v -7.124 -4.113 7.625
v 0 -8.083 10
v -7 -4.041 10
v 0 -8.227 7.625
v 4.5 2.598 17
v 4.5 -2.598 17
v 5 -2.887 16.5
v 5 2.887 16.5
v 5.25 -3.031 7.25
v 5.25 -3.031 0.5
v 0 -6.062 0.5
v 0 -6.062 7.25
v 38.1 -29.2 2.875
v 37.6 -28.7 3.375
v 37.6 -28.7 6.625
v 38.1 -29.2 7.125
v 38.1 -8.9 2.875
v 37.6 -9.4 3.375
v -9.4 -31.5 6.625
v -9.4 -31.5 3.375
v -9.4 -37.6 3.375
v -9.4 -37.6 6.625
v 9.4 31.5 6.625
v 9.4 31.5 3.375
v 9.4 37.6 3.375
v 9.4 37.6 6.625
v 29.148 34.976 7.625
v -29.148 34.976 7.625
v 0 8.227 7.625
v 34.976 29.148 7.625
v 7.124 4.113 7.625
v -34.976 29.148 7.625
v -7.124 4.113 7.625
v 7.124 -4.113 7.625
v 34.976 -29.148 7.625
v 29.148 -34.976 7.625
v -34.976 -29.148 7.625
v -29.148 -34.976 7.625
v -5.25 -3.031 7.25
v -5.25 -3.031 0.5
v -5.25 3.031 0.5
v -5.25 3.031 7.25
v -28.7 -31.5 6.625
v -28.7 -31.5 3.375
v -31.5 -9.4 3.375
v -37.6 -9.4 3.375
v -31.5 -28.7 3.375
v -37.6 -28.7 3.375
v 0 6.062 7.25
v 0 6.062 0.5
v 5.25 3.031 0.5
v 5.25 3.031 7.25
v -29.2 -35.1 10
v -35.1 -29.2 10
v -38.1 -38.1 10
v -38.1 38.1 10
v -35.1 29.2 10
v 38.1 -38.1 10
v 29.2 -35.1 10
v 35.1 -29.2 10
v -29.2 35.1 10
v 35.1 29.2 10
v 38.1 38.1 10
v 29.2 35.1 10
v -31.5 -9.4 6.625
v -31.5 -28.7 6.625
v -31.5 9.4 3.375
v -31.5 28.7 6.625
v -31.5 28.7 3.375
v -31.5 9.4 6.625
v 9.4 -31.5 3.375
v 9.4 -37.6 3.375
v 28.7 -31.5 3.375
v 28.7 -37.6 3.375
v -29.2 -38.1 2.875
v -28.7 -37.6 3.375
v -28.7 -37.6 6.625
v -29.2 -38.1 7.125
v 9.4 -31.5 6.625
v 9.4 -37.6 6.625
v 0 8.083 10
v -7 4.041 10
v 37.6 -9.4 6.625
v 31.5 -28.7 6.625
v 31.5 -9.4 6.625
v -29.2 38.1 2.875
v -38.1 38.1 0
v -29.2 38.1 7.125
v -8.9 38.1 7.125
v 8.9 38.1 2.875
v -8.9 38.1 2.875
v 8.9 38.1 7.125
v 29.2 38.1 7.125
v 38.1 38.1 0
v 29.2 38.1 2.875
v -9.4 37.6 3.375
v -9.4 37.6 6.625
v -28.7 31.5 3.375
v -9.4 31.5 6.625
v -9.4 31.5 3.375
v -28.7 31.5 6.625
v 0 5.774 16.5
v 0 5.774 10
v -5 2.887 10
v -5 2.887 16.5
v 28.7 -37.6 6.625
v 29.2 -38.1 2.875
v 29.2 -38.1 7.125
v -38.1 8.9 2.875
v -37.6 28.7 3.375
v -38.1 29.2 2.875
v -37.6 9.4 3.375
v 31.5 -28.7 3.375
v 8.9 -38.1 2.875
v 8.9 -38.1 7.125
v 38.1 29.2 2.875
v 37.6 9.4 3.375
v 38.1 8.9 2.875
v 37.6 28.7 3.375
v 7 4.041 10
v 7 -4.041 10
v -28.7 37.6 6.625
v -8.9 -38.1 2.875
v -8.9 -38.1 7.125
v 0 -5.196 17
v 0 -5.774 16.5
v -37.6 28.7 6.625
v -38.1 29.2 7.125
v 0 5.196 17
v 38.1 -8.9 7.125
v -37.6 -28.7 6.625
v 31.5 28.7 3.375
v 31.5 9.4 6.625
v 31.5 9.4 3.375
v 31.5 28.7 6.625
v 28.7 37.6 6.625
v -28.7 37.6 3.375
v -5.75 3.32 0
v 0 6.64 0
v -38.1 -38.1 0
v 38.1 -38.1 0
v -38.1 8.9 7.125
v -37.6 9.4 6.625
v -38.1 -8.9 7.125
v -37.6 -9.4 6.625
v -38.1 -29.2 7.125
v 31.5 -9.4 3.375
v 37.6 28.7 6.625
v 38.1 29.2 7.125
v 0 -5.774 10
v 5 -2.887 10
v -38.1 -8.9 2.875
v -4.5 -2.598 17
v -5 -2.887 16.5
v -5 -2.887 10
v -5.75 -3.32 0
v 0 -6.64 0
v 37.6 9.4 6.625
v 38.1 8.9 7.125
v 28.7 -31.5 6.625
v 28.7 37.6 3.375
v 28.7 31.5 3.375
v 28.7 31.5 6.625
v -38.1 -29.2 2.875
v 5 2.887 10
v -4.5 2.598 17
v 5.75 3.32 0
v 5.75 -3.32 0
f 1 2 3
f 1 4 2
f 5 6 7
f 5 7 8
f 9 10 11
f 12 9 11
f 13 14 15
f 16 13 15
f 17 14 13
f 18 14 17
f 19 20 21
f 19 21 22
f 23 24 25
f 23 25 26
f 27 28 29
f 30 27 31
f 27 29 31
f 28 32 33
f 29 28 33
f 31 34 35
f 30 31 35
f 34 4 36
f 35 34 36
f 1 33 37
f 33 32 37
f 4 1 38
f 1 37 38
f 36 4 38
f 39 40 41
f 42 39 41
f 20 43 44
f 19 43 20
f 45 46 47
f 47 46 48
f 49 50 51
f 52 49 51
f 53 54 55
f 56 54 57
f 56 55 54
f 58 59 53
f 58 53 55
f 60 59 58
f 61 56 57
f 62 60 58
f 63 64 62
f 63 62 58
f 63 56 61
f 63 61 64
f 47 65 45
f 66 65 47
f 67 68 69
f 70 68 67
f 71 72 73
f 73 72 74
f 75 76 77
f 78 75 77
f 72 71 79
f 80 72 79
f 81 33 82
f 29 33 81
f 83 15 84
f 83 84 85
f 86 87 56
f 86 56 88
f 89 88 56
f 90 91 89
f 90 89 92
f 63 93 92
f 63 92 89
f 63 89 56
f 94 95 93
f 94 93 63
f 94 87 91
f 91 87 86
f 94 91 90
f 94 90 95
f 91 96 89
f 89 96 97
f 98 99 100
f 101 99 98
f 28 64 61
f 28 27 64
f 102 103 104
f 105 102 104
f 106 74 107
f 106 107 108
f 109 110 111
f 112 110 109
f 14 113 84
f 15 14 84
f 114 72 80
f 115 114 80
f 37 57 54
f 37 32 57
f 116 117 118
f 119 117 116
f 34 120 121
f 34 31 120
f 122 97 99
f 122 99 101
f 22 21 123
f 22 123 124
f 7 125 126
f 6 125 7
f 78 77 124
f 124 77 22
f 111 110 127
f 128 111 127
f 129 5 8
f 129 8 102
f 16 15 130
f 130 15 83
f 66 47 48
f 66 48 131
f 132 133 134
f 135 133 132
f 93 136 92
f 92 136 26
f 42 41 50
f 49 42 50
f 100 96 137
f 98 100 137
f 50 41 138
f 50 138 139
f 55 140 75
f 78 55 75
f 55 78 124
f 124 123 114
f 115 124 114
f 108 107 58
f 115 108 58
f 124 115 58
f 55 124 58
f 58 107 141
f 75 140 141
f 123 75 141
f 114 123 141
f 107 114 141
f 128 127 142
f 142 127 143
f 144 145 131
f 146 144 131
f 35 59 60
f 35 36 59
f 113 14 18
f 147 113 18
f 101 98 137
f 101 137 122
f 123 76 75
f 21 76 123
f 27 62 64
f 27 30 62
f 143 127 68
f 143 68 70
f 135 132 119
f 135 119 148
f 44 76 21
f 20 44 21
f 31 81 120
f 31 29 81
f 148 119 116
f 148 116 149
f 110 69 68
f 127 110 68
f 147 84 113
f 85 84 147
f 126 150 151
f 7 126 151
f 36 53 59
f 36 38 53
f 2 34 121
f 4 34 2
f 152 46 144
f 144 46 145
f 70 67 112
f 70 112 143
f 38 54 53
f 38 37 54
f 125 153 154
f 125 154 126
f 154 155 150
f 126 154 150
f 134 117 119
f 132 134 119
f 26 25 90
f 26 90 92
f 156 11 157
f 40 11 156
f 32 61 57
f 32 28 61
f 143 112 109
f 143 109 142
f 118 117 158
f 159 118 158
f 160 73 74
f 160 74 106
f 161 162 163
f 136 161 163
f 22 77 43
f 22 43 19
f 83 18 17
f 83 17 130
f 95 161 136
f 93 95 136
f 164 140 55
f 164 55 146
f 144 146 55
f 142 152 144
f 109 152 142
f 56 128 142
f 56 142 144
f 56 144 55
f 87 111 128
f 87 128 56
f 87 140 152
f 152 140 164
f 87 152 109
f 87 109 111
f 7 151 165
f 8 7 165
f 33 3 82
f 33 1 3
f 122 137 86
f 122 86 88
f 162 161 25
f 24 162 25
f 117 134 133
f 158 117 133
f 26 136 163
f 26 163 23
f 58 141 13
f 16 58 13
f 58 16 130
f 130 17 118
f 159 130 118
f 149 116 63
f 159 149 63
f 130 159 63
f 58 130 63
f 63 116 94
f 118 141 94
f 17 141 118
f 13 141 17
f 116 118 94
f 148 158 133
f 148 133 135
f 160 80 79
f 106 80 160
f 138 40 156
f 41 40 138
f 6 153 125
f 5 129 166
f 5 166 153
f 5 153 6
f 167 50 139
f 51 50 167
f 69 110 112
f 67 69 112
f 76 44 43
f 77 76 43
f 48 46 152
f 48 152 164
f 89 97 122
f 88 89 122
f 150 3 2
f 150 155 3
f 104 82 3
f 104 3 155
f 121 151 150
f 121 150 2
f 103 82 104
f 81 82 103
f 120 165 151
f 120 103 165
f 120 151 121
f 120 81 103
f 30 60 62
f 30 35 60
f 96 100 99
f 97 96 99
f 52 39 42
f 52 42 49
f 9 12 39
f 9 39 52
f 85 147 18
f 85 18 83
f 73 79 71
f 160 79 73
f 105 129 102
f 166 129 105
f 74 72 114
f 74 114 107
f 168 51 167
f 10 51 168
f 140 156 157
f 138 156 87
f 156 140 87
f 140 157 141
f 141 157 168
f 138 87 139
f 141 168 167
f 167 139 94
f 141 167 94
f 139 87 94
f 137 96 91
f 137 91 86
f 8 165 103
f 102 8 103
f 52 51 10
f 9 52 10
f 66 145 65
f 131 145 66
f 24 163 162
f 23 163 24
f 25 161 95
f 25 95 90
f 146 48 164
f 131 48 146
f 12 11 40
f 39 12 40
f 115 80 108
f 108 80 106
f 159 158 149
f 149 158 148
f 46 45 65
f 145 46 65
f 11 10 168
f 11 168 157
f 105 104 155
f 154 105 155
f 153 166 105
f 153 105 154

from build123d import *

# Parameters (mm, degrees)
F0_W      = 76.2
F0_H      = 76.2
F1_DEPTH  = 10
F3_DEPTH  = 7
F5_DEPTH  = 7.25
F6_W      = 19.3
F6_H      = 3.25
F8_DEPTH  = 6.6
F9_COUNT  = 4
F9_ANGLE  = 270
F11_SIZE  = 0.5
F19_DEPTH = 2.375
F19_TAPER = 3


with BuildPart() as f1:
    # F0 (on Top) → F1 (new body)
    with BuildSketch(Plane.XY):
        Rectangle(F0_W, F0_H)
    extrude(amount=F1_DEPTH)

    # F2 (on face) → F3 (join)
    with BuildSketch(Plane.XY.offset(10)):
        Polygon((5, -2.8867513459), (5, 2.8867513459), (0, 5.7735026919), (-5, 2.8867513459), (-5, -2.8867513459), (0, -5.7735026919), align=None)
    extrude(amount=F3_DEPTH)

    # F4 (on face) → F5 (cut)
    with BuildSketch(Plane(origin=(0, 0, 0), x_dir=(1, 0, 0), z_dir=(0, 0, -1))):
        Polygon((5.25, -3.0310889132), (5.25, 3.0310889132), (0, 6.0621778265), (-5.25, 3.0310889132), (-5.25, -3.0310889132), (0, -6.0621778265), align=None)
    extrude(amount=-F5_DEPTH, mode=Mode.SUBTRACT)


with BuildPart() as f8:
    # F6 (on face) → F8 (new body)
    with BuildSketch(Plane.XZ.offset(38.1)):
        with Locations((-19.05, 5)):
            Rectangle(F6_W, F6_H)
    extrude(amount=-F8_DEPTH)


with BuildPart() as f8b:
    # F6 (on face) → F8, piece 2 (new body)
    with BuildSketch(Plane.XZ.offset(38.1)):
        with Locations((19.05, 5)):
            Rectangle(F6_W, F6_H)
    extrude(amount=-F8_DEPTH)


with BuildPart() as f9_1:
    # F9: instance of F8b
    add(f8b.part.rotate(Axis((0, 0, 20.068032667), (0, 0, -1)), 1 * F9_ANGLE / (F9_COUNT - 1)))


with BuildPart() as f9_2:
    # F9: instance of F8b
    add(f8b.part.rotate(Axis((0, 0, 20.068032667), (0, 0, -1)), 2 * F9_ANGLE / (F9_COUNT - 1)))


with BuildPart() as f9_3:
    # F9: instance of F8b
    add(f8b.part.rotate(Axis((0, 0, 20.068032667), (0, 0, -1)), 3 * F9_ANGLE / (F9_COUNT - 1)))


with BuildPart() as f9_4:
    # F9: instance of F8
    add(f8.part.rotate(Axis((0, 0, 20.068032667), (0, 0, -1)), 1 * F9_ANGLE / (F9_COUNT - 1)))


with BuildPart() as f9_5:
    # F9: instance of F8
    add(f8.part.rotate(Axis((0, 0, 20.068032667), (0, 0, -1)), 2 * F9_ANGLE / (F9_COUNT - 1)))


with BuildPart() as f9_6:
    # F9: instance of F8
    add(f8.part.rotate(Axis((0, 0, 20.068032667), (0, 0, -1)), 3 * F9_ANGLE / (F9_COUNT - 1)))


with BuildPart() as f1_1:
    add(f1.part)

    # F10: cut F9_3, F9_6, F9_2, F9_5, F9_1, F9_4, F8b, F8
    add(f9_3.part, mode=Mode.SUBTRACT)
    add(f9_6.part, mode=Mode.SUBTRACT)
    add(f9_2.part, mode=Mode.SUBTRACT)
    add(f9_5.part, mode=Mode.SUBTRACT)
    add(f9_1.part, mode=Mode.SUBTRACT)
    add(f9_4.part, mode=Mode.SUBTRACT)
    add(f8b.part, mode=Mode.SUBTRACT)
    add(f8.part, mode=Mode.SUBTRACT)

    # F11
    f11_edges = [f1_1.edges().sort_by_distance(p)[0] for p in [
        (5, 0, 17),
        (2.5, 4.330127, 17),
        (-2.5, 4.330127, 17),
        (-5, 0, 17),
        (-2.5, -4.330127, 17),
        (2.5, -4.330127, 17),
        (2.625, 4.546633, 0),
        (5.25, 0, 0),
        (2.625, -4.546633, 0),
        (-2.625, -4.546633, 0),
        (-5.25, 0, 0),
        (-2.625, 4.546633, 0),
        (38.1, -19.05, 6.625),
        (38.1, -9.4, 5),
        (38.1, -19.05, 3.375),
        (38.1, -28.7, 5),
        (38.1, 19.05, 3.375),
        (38.1, 9.4, 5),
        (38.1, 28.7, 5),
        (38.1, 19.05, 6.625),
        (19.05, 38.1, 6.625),
        (28.7, 38.1, 5),
        (9.4, 38.1, 5),
        (19.05, 38.1, 3.375),
        (28.7, -38.1, 5),
        (19.05, -38.1, 6.625),
        (9.4, -38.1, 5),
        (19.05, -38.1, 3.375),
        (-9.4, -38.1, 5),
        (-19.05, -38.1, 6.625),
        (-19.05, -38.1, 3.375),
        (-28.7, -38.1, 5),
        (-38.1, -28.7, 5),
        (-38.1, -19.05, 6.625),
        (-38.1, -9.4, 5),
        (-38.1, -19.05, 3.375),
        (-38.1, 9.4, 5),
        (-38.1, 19.05, 6.625),
        (-38.1, 28.7, 5),
        (-38.1, 19.05, 3.375),
        (-19.05, 38.1, 6.625),
        (-28.7, 38.1, 5),
        (-9.4, 38.1, 5),
        (-19.05, 38.1, 3.375),
    ]]
    chamfer(f11_edges, length=F11_SIZE)

    # F18 (on face) → F19 (cut)
    with BuildSketch(Plane.XY.offset(10)):
        Polygon((-29.2, 35.1), (-35.1, 29.2), (-35.1, -29.2), (-29.2, -35.1), (29.2, -35.1), (35.1, -29.2), (35.1, 29.2), (29.2, 35.1), align=None)
        Polygon((0, -8.0829037687), (-7, -4.0414518843), (-7, 4.0414518843), (0, 8.0829037687), (7, 4.0414518843), (7, -4.0414518843), align=None, mode=Mode.SUBTRACT)
    extrude(amount=-F19_DEPTH, taper=F19_TAPER, mode=Mode.SUBTRACT)


solid = f1_1.part
